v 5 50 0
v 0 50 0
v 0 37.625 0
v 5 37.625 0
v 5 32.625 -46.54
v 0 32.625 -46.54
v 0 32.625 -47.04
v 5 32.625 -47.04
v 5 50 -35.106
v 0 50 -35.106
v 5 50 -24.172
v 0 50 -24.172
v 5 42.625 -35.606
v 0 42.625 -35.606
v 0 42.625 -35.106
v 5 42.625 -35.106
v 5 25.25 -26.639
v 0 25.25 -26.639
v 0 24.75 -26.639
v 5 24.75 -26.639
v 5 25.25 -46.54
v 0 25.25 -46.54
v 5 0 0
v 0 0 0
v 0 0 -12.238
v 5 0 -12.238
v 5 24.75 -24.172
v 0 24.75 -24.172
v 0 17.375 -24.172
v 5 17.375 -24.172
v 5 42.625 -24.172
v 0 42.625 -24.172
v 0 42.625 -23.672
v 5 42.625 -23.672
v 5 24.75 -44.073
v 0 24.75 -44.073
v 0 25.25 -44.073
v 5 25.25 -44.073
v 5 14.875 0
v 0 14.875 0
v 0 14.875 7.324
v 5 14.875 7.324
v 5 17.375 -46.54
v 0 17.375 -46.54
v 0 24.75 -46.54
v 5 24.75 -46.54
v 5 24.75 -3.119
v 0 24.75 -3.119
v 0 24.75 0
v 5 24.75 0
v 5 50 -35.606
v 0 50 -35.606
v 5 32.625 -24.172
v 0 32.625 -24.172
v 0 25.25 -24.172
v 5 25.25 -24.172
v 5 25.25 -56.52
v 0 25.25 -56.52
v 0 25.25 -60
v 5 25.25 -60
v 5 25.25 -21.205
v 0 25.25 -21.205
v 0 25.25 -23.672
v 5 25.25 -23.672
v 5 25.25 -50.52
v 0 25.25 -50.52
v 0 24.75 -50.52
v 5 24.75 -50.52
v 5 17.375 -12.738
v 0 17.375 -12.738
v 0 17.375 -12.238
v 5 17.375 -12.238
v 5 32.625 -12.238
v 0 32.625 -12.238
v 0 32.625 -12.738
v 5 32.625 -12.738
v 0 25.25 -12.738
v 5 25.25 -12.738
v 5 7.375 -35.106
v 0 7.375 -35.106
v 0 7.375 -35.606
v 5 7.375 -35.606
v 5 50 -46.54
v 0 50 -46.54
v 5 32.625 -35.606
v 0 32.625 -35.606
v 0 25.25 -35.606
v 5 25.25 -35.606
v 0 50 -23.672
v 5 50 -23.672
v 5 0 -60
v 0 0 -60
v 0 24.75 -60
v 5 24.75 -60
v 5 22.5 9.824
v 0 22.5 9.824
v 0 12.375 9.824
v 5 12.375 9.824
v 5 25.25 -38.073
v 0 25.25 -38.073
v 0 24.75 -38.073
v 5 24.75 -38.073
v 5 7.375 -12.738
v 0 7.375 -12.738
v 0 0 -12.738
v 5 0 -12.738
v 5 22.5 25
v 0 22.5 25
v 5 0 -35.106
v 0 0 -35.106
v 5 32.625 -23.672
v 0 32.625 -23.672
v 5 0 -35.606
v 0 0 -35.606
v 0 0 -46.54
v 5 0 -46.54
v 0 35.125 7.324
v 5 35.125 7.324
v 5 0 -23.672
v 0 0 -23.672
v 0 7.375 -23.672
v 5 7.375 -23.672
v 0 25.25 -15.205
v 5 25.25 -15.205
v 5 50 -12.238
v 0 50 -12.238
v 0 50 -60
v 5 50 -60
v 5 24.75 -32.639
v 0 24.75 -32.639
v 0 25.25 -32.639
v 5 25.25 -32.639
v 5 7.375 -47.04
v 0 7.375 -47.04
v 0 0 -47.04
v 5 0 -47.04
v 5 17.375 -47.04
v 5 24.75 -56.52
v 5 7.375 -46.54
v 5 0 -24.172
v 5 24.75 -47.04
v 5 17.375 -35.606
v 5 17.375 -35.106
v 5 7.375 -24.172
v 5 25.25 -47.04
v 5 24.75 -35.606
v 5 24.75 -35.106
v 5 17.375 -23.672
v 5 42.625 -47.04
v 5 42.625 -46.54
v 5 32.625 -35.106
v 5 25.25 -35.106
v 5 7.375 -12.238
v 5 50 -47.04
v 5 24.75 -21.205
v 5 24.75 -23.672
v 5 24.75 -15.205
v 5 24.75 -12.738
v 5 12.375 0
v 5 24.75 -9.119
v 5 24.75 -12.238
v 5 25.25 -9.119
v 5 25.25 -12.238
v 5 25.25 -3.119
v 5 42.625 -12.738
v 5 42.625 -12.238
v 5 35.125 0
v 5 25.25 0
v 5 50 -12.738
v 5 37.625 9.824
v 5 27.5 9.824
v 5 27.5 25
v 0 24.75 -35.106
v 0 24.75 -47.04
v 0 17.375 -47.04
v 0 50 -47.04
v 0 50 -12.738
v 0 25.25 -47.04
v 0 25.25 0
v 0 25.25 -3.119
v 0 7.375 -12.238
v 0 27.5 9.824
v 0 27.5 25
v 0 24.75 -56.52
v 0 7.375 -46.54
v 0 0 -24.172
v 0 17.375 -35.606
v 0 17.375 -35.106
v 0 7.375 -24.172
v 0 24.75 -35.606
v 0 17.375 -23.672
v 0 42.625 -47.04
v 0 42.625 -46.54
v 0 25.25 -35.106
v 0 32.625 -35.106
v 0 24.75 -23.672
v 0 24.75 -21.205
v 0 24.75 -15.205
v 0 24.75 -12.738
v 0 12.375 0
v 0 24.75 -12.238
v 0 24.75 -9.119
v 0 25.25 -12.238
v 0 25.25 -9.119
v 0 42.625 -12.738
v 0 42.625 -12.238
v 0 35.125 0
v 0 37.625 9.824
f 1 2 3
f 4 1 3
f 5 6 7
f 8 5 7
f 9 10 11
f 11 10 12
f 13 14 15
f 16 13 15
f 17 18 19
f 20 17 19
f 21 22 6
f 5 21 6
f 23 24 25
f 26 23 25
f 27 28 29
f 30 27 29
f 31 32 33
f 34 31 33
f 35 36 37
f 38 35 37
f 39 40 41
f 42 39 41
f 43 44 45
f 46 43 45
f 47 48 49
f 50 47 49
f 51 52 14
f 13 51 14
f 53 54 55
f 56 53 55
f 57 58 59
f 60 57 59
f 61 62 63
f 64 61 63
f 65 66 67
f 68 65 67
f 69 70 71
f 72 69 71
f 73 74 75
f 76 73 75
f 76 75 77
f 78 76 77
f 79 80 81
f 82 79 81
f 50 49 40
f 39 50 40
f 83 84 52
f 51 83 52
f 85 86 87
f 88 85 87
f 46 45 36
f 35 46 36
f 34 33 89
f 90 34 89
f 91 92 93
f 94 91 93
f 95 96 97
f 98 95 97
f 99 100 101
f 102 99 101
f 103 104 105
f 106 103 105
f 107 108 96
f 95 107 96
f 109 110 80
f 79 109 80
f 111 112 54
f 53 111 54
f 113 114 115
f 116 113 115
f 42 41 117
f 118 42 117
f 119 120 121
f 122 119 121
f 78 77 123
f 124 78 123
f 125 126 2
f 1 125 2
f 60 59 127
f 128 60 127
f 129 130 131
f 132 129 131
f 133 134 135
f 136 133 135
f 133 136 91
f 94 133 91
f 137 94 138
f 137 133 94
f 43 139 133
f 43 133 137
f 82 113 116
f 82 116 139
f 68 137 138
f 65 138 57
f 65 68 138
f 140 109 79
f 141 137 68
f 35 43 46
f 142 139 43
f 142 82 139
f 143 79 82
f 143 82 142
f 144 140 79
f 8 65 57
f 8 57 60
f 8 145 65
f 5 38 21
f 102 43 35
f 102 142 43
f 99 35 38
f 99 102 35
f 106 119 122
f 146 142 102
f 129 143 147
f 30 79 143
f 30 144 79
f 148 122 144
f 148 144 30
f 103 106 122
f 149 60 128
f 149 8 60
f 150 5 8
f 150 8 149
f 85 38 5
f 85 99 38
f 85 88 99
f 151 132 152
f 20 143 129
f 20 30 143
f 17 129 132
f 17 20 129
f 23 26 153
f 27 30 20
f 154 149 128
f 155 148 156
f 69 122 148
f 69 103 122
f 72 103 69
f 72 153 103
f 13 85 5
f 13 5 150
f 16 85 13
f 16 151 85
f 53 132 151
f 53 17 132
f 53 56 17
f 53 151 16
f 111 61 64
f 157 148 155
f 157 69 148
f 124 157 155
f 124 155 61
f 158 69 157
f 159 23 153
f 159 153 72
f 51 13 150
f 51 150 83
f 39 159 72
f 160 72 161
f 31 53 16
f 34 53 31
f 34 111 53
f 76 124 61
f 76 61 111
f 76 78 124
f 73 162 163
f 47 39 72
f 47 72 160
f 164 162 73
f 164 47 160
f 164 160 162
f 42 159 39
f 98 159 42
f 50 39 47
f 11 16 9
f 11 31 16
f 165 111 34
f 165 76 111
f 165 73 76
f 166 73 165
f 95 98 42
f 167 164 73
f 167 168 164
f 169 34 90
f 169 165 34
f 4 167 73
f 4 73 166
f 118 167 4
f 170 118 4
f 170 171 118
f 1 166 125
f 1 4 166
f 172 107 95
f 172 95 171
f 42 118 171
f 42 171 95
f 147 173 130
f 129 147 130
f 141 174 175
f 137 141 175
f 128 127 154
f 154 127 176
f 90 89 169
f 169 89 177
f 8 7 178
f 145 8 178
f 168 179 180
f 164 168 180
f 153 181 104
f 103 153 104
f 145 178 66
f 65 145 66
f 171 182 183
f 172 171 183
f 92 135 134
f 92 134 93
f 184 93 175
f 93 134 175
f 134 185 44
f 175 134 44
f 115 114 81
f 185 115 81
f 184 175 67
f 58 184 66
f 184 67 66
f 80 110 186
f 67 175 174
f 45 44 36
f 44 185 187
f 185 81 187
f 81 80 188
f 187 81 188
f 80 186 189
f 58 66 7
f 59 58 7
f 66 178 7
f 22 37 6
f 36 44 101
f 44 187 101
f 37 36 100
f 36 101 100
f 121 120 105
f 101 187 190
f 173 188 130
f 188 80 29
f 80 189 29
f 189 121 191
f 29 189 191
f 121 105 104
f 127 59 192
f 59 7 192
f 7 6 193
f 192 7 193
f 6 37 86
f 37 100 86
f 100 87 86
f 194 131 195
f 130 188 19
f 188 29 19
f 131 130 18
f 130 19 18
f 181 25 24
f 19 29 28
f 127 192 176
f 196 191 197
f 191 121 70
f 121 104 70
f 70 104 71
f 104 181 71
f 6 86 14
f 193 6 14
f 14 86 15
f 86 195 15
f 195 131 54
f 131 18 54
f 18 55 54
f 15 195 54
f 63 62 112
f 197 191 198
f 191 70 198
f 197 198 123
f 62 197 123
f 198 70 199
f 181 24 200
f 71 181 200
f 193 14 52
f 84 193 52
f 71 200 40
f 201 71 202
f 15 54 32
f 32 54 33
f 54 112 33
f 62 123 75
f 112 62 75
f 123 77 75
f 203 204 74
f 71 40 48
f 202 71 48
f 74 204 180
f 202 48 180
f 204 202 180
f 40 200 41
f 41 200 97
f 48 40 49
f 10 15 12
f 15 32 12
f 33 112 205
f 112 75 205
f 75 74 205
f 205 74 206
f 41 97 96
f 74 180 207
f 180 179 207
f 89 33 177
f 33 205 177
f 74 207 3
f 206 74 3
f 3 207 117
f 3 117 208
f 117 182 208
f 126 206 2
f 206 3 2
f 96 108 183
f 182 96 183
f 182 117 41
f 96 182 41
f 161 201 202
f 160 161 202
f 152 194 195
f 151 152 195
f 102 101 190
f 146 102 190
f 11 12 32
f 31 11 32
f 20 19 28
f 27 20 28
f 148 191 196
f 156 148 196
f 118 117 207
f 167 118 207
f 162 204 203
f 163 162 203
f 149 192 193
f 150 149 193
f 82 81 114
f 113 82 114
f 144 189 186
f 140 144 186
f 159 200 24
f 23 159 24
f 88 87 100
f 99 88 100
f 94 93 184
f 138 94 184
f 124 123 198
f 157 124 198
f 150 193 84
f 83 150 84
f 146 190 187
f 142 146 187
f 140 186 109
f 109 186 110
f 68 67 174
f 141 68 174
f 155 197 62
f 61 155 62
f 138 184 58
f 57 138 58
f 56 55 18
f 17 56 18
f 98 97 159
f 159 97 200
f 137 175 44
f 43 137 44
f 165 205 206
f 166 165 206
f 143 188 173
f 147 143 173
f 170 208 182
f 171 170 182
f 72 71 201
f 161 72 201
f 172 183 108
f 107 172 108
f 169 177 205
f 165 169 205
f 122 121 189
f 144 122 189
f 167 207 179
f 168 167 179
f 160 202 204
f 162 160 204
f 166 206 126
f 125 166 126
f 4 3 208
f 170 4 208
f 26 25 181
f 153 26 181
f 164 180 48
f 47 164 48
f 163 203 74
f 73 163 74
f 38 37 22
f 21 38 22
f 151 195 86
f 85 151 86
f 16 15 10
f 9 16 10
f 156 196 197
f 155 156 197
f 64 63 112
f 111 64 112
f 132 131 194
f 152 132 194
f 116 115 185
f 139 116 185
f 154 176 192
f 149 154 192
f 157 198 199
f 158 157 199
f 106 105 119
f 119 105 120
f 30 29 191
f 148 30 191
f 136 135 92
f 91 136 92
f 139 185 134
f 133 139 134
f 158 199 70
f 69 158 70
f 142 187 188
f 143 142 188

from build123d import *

# Parameters (mm, degrees)
F1_DEPTH = 5


# Not quite as in the source:
# - a feature names something its author has since deleted; it is built from what else it names


with BuildPart() as f1:
    # F0 (on Right) → F1 (new body)
    with BuildSketch(Plane.YZ):
        Polygon((12.375, 0), (0, 0), (0, -12.238), (7.3750000447, -12.238), (7.3750000447, -12.738), (0, -12.738), (0, -23.672), (7.3750000447, -23.672), (7.3750000447, -24.172), (0, -24.172), (0, -35.106), (7.3750000447, -35.106), (7.3750000447, -35.606), (0, -35.606), (0, -46.54), (7.3750000447, -46.54), (7.3750000447, -47.04), (0, -47.04), (0, -60), (24.75, -60), (24.75, -56.52), (25.25, -56.52), (25.25, -60), (50, -60), (50, -47.04), (42.6249988377, -47.04), (42.6249988377, -46.54), (50, -46.54), (50, -35.606), (42.6249988377, -35.606), (42.6249988377, -35.106), (50, -35.106), (50, -24.172), (42.6249988377, -24.172), (42.6249988377, -23.672), (50, -23.672), (50, -12.738), (42.6249988377, -12.738), (42.6249988377, -12.238), (50, -12.238), (50, 0), (37.625, 0), (37.625, 9.8238829523), (27.5, 9.8238829523), (27.5, 25), (22.5, 25), (22.5, 9.8238829523), (12.375, 9.8238829523), align=None)
        Polygon((25.25, -44.073), (25.25, -46.54), (32.625, -46.54), (32.625, -47.04), (25.25, -47.04), (25.25, -50.52), (24.75, -50.52), (24.75, -47.04), (17.375, -47.04), (17.375, -46.54), (24.75, -46.54), (24.75, -44.073), align=None, mode=Mode.SUBTRACT)
        Polygon((25.25, -32.639), (25.25, -35.106), (32.625, -35.106), (32.625, -35.606), (25.25, -35.606), (25.25, -38.073), (24.75, -38.073), (24.75, -35.606), (17.375, -35.606), (17.375, -35.106), (24.75, -35.106), (24.75, -32.639), align=None, mode=Mode.SUBTRACT)
        Polygon((25.25, -21.205), (25.25, -23.672), (32.625, -23.672), (32.625, -24.172), (25.25, -24.172), (25.25, -26.639), (24.75, -26.639), (24.75, -24.172), (17.375, -24.172), (17.375, -23.672), (24.75, -23.672), (24.75, -21.205), align=None, mode=Mode.SUBTRACT)
        Polygon((25.25, -9.119), (25.25, -12.238), (32.625, -12.238), (32.625, -12.738), (25.25, -12.738), (25.25, -15.205), (24.75, -15.205), (24.75, -12.738), (17.375, -12.738), (17.375, -12.238), (24.75, -12.238), (24.75, -9.119), align=None, mode=Mode.SUBTRACT)
        Polygon((25.25, -1.304), (25.25, -3.119), (24.75, -3.119), (24.75, 0), (14.875, 0), (14.875, 7.3238829523), (35.125, 7.3238829523), (35.125, 0), (25.25, 0), align=None, mode=Mode.SUBTRACT)
    extrude(amount=F1_DEPTH)


solid = f1.part
